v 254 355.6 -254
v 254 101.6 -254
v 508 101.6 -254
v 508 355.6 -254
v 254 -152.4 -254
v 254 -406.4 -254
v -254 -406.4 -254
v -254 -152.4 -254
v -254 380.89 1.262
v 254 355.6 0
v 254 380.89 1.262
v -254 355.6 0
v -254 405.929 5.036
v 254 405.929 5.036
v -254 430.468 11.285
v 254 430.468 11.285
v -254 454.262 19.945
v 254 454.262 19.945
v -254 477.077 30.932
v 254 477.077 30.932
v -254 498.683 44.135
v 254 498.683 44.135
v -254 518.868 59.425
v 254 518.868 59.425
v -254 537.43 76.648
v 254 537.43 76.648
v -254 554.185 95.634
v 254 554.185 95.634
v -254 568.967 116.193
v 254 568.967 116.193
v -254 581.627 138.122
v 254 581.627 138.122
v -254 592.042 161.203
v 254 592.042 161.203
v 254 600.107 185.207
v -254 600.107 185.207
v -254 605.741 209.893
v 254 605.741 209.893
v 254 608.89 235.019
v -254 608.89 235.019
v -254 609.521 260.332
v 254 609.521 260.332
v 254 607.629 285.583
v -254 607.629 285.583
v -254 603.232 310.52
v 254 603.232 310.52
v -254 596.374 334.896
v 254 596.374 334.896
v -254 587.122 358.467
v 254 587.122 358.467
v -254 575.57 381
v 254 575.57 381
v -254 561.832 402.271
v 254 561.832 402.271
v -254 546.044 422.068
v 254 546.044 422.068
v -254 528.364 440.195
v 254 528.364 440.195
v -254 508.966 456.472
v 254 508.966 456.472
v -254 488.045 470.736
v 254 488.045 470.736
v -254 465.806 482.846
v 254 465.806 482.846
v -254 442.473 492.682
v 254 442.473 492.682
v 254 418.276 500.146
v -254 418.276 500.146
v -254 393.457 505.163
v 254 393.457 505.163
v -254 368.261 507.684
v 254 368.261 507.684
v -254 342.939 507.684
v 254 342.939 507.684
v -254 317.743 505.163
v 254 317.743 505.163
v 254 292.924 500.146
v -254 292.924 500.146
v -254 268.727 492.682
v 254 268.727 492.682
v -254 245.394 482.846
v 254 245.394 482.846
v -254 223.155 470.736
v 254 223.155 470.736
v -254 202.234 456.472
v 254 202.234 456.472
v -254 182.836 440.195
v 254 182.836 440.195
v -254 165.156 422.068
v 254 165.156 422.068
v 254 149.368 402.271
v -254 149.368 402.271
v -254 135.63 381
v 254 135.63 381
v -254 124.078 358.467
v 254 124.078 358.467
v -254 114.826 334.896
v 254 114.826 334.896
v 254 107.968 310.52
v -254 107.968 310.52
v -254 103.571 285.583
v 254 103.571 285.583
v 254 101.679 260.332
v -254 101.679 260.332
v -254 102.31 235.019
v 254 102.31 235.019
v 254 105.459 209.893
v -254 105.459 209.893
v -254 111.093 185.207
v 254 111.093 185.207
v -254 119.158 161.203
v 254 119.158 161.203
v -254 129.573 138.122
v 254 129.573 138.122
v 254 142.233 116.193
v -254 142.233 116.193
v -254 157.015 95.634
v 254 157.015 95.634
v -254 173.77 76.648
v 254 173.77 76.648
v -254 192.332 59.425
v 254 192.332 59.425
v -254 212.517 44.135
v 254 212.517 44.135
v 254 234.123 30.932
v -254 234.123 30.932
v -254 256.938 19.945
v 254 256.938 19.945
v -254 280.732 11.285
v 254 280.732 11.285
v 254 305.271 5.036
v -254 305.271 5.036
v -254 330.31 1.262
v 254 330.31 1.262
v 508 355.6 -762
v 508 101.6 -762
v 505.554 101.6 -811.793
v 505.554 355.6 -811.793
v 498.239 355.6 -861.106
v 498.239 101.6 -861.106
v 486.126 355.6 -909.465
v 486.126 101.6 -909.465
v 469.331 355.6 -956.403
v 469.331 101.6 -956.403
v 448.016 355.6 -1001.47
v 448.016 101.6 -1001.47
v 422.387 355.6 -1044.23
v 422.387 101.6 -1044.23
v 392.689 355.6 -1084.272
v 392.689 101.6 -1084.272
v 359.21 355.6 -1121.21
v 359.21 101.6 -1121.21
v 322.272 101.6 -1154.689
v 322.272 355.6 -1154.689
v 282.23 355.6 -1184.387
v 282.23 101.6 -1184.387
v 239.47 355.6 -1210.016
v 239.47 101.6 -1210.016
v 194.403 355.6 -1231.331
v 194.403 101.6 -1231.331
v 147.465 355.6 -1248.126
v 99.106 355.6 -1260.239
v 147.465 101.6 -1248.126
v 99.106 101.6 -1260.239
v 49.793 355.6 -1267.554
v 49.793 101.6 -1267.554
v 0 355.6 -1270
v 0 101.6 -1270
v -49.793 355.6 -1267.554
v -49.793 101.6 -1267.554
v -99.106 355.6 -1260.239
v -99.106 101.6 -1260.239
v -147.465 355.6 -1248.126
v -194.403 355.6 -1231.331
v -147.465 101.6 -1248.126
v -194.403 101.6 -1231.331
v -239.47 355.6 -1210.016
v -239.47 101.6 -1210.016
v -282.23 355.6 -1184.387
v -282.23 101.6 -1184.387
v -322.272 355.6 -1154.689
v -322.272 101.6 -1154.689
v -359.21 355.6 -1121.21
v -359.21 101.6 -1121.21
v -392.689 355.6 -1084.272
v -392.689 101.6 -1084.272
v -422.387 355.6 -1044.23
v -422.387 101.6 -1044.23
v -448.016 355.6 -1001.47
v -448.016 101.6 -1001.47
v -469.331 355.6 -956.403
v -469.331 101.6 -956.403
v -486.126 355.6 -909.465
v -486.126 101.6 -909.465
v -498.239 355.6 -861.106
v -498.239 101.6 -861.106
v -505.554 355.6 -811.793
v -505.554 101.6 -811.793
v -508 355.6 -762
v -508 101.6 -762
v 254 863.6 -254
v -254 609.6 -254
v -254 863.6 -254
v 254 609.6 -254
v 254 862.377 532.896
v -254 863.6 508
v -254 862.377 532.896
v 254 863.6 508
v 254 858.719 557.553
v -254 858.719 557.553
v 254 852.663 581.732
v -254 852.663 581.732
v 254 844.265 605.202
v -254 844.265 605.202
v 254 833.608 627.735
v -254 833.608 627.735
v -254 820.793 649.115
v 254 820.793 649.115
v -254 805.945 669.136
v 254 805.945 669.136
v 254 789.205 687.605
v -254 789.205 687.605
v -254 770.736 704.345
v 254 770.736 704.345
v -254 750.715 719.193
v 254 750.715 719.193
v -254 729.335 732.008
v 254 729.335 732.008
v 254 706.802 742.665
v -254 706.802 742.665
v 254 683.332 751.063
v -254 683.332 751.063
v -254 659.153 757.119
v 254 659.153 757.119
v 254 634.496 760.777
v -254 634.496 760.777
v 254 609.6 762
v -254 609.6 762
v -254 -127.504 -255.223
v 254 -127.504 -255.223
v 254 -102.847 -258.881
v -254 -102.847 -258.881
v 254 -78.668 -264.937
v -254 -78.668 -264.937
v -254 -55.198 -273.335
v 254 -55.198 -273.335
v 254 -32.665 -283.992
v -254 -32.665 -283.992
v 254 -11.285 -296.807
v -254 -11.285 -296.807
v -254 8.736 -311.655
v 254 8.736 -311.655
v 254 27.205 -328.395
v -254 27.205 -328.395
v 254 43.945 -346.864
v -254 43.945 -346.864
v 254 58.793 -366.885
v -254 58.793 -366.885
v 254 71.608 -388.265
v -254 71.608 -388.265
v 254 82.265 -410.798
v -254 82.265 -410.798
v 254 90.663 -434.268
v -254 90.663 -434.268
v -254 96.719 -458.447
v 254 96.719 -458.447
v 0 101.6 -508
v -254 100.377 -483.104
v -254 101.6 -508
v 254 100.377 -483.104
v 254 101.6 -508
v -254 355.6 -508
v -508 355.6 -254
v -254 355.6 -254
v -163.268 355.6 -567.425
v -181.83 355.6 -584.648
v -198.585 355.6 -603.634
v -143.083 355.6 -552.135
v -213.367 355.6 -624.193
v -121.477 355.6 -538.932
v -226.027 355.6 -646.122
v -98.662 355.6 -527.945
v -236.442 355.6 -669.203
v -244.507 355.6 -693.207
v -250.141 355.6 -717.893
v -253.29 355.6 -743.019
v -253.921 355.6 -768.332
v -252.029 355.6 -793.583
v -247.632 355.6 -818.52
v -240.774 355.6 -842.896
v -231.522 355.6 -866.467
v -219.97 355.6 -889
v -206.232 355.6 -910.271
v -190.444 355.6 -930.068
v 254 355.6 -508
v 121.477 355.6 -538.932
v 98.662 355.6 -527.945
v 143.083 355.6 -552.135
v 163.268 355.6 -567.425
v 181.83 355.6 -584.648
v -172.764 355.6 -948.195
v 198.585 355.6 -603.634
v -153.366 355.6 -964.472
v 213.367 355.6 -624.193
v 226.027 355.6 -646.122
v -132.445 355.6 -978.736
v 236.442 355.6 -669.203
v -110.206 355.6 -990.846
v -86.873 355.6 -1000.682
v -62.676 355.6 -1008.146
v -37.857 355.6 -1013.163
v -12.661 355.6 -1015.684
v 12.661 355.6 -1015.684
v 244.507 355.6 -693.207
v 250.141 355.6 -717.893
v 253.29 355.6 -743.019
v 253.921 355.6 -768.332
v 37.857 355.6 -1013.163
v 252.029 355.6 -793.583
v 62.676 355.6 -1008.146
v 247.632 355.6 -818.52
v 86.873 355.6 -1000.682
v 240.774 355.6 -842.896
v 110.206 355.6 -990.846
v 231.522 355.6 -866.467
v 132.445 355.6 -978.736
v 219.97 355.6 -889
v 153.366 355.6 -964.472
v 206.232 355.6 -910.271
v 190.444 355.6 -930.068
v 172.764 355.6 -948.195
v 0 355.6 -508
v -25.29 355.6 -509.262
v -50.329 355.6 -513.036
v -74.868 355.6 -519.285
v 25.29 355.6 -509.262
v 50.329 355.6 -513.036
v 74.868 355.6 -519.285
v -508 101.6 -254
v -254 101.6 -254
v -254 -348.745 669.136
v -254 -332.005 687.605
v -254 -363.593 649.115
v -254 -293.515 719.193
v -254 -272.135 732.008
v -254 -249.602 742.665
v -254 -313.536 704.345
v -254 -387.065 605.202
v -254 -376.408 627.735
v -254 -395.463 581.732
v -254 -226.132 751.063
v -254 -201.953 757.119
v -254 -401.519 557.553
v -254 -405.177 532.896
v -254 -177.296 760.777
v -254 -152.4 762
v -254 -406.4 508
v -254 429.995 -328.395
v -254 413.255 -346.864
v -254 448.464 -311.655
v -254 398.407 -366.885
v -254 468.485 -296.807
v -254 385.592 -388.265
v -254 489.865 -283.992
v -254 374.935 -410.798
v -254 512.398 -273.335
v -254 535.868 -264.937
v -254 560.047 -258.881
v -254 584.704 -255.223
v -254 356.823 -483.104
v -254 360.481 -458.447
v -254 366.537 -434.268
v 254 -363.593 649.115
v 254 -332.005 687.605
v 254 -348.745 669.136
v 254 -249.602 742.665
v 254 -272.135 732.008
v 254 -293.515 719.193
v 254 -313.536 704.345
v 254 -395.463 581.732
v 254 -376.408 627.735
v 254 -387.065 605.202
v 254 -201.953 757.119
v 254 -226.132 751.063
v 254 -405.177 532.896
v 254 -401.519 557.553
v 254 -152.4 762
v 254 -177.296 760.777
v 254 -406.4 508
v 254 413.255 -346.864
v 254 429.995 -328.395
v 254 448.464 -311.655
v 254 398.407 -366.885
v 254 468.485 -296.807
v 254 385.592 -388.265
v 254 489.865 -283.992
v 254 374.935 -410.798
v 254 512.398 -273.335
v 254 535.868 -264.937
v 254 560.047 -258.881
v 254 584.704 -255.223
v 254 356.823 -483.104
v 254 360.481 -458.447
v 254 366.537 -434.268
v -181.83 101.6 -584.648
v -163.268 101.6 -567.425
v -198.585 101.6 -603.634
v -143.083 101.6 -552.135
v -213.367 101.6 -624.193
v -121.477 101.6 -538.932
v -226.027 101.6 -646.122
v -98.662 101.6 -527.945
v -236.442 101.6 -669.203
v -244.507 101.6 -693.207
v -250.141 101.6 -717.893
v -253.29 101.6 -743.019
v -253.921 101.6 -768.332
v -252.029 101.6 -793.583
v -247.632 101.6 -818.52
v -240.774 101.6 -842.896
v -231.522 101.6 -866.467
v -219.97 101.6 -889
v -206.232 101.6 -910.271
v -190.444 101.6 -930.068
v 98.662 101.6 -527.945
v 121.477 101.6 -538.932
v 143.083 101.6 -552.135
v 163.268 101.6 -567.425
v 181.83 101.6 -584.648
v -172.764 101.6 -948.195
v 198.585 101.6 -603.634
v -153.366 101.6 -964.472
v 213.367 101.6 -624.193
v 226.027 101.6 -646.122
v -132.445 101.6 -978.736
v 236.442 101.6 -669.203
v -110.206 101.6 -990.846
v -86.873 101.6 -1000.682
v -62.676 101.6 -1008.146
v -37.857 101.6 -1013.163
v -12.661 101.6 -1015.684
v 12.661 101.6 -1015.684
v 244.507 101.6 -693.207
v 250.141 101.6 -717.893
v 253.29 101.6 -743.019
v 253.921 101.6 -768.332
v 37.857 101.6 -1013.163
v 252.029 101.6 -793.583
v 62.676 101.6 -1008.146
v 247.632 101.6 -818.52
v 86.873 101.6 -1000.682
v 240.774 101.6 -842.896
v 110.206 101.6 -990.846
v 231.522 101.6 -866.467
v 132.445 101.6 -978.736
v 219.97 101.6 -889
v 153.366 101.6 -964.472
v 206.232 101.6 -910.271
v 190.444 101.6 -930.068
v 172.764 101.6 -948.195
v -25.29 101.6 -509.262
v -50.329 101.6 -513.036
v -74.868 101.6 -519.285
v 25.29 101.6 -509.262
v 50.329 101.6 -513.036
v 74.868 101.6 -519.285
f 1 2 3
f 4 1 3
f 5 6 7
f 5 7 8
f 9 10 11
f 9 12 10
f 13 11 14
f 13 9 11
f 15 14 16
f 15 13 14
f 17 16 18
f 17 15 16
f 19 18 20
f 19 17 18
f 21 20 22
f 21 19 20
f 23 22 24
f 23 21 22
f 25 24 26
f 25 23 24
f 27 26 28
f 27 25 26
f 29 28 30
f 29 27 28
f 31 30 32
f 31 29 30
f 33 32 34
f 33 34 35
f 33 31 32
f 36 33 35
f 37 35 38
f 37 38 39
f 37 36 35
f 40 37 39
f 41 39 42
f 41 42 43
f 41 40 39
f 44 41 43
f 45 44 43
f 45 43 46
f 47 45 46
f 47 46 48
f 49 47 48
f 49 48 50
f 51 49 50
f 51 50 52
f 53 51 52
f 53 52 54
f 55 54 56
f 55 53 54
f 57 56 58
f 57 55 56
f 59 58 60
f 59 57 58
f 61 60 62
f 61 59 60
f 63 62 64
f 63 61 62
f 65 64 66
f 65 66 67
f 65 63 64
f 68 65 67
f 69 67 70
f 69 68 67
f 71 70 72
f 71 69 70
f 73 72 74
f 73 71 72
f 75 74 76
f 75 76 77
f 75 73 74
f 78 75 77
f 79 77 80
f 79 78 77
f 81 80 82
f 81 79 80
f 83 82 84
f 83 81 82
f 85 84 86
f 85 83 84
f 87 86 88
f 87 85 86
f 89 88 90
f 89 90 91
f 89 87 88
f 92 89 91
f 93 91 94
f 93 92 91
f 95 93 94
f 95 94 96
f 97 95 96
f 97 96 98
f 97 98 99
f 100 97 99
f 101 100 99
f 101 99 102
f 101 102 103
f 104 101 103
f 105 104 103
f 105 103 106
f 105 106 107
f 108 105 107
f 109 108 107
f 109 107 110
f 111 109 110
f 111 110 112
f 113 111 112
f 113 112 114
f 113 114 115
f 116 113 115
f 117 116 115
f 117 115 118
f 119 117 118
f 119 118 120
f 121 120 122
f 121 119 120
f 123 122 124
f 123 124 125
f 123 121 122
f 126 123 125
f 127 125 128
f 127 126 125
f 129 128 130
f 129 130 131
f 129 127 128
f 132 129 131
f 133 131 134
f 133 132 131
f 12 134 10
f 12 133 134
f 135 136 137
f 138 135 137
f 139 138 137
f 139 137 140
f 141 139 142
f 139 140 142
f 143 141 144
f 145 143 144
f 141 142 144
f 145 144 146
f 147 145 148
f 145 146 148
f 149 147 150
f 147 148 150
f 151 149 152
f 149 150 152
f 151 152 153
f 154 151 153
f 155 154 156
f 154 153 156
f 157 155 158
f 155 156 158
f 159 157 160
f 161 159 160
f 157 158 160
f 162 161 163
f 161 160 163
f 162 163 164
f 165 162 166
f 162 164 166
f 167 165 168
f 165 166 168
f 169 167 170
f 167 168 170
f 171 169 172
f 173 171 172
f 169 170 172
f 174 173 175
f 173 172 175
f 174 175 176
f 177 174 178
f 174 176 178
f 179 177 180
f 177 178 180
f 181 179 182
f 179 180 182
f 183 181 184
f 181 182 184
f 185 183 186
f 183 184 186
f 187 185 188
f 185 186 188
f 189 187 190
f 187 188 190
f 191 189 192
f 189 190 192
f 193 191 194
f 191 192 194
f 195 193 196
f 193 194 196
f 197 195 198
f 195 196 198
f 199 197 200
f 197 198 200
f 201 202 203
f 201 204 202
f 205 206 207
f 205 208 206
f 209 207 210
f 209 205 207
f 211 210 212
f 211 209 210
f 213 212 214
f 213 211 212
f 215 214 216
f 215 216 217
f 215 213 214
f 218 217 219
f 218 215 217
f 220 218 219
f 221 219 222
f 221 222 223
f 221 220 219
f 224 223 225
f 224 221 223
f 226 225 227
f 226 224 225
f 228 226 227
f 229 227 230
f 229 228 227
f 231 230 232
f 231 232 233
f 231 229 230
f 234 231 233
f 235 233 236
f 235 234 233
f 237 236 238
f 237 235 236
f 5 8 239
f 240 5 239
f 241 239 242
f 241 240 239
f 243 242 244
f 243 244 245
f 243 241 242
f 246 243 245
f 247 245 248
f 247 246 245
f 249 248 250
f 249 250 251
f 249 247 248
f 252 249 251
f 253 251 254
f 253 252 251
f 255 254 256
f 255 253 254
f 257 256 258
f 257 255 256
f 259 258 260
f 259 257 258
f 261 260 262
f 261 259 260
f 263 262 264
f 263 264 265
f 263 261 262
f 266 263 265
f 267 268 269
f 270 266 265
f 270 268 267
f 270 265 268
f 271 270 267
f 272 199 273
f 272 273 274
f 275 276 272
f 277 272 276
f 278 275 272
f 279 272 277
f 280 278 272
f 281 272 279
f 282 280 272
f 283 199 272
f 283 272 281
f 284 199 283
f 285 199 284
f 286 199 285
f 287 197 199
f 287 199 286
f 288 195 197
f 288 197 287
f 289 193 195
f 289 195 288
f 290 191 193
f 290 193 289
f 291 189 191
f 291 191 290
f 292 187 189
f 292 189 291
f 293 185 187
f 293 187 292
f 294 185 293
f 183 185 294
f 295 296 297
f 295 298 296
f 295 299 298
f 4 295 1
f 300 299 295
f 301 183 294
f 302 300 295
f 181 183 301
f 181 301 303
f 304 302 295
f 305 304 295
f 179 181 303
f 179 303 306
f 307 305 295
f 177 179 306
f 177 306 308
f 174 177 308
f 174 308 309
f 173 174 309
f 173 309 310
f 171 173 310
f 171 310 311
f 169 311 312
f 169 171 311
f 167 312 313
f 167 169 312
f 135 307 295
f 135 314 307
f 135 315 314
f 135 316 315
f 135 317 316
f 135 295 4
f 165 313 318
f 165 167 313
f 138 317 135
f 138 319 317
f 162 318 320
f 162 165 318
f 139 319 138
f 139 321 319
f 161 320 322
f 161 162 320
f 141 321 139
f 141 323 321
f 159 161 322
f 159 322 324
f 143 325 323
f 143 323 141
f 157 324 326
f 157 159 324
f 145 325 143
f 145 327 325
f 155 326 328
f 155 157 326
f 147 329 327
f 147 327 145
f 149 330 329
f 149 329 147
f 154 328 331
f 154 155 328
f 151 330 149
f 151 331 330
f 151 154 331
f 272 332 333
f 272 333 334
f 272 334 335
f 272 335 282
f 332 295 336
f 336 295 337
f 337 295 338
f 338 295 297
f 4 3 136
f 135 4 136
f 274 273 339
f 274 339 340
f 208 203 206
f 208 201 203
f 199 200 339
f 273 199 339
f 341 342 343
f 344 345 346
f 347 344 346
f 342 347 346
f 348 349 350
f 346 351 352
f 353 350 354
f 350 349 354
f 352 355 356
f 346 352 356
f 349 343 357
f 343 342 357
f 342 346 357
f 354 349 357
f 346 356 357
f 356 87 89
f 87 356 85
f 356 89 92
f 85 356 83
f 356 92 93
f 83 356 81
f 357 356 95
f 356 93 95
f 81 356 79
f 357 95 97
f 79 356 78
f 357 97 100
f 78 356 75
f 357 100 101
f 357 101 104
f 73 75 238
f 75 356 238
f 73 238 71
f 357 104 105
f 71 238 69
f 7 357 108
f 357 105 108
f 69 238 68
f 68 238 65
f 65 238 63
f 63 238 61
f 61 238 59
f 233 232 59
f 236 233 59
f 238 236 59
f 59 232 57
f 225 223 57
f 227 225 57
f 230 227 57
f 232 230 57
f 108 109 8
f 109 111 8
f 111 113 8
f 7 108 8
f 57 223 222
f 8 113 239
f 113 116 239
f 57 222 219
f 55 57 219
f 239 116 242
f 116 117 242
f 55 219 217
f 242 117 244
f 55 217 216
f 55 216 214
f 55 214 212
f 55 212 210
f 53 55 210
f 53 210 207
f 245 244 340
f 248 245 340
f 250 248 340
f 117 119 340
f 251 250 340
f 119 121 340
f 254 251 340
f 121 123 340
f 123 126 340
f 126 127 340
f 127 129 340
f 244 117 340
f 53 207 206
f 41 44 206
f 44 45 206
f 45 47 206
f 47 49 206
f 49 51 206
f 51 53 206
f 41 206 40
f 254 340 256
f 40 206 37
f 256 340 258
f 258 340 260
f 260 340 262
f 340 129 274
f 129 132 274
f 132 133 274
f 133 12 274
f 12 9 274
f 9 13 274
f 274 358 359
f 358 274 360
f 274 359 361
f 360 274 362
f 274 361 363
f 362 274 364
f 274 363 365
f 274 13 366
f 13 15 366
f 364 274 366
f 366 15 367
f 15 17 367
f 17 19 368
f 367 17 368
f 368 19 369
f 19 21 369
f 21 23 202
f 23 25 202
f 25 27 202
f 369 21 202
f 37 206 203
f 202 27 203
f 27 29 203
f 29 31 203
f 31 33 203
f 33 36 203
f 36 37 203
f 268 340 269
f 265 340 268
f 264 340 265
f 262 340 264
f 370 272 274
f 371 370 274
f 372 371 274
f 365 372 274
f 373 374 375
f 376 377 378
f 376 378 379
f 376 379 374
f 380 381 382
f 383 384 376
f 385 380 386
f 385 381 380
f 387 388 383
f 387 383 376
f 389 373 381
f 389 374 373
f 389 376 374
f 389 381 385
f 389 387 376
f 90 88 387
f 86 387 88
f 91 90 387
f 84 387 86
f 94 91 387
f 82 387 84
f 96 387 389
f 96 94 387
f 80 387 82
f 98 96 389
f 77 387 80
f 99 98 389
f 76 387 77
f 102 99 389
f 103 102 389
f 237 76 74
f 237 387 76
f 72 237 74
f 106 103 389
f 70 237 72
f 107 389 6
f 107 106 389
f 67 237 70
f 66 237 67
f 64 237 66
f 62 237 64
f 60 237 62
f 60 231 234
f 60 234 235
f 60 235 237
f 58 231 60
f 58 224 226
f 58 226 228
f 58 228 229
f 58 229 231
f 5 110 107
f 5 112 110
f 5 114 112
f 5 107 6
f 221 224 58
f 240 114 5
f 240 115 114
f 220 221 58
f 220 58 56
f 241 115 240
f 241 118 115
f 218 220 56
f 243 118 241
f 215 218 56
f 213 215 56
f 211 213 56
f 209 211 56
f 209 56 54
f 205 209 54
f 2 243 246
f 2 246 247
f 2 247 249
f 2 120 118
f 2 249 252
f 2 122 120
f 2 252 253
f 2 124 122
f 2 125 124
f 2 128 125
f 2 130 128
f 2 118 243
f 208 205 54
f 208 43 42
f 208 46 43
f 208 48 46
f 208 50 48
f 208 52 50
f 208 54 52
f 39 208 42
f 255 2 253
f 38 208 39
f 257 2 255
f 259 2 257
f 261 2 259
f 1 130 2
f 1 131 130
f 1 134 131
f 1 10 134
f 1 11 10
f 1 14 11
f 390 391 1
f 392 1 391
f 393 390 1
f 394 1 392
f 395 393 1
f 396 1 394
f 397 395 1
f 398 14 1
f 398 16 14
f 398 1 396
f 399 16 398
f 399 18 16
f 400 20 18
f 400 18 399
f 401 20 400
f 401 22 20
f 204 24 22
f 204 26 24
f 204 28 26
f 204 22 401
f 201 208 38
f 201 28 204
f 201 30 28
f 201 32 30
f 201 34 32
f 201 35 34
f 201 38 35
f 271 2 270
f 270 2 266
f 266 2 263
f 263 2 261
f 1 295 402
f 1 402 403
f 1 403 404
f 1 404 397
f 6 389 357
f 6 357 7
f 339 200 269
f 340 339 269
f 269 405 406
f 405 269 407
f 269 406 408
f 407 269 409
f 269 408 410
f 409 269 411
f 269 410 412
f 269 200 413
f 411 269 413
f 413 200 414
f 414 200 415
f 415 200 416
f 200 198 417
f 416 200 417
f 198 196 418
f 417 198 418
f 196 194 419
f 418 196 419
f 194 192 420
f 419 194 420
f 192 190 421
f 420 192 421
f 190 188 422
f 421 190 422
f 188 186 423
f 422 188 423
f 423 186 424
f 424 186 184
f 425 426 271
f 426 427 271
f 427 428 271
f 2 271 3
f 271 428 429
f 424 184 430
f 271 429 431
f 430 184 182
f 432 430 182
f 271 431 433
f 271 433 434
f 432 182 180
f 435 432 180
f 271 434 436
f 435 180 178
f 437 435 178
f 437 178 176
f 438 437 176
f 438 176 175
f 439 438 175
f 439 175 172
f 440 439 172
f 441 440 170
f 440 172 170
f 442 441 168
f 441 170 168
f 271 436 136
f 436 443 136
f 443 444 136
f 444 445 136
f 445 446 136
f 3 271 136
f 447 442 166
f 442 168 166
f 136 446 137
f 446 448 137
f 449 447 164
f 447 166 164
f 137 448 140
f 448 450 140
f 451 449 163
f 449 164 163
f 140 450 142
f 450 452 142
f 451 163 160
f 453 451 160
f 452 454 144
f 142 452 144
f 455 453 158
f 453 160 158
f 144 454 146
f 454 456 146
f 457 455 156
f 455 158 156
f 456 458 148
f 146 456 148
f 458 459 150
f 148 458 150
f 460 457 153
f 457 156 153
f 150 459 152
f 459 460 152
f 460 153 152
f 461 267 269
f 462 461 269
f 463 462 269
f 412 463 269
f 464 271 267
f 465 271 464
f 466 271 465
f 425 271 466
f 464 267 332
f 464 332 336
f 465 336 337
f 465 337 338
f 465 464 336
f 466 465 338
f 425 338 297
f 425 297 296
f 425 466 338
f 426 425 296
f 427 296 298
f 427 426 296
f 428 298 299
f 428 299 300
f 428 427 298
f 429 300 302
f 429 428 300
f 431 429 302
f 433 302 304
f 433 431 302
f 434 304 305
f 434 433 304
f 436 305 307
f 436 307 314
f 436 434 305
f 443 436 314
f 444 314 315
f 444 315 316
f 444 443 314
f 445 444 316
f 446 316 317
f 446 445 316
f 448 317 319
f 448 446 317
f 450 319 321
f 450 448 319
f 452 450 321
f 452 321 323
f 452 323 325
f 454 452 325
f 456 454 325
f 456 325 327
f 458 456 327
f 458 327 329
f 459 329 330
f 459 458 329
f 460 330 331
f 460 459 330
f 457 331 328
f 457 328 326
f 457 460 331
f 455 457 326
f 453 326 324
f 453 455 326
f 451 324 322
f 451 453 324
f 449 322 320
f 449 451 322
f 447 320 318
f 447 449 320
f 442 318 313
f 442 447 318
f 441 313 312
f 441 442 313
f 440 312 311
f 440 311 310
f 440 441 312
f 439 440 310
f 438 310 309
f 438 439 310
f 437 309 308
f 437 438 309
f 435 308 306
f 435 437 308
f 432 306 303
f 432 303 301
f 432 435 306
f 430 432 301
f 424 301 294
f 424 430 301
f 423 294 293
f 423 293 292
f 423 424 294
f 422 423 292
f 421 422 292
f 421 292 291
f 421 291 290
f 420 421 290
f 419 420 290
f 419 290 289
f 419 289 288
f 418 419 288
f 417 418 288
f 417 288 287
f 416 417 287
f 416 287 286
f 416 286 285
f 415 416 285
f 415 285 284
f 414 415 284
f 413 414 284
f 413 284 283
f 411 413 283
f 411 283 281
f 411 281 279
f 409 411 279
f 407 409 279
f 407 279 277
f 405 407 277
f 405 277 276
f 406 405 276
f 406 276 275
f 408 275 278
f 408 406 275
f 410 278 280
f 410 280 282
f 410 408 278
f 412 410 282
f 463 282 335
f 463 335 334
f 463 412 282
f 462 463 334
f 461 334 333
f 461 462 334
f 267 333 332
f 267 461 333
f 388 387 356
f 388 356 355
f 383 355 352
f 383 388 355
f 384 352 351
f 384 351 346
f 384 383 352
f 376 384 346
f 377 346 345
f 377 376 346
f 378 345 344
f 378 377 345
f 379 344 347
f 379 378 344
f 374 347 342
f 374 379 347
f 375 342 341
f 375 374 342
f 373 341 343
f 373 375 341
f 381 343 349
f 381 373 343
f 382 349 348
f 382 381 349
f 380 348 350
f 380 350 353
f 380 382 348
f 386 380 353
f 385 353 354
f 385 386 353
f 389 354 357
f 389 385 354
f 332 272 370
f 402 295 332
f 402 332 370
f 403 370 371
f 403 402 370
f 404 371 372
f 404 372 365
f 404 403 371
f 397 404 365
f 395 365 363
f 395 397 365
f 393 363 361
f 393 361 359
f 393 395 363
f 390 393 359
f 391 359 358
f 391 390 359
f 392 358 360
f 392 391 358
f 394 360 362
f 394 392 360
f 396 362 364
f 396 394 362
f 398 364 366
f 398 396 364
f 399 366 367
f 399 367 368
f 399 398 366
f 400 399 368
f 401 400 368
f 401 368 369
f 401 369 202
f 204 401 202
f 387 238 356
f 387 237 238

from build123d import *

# Parameters (mm, degrees)
SKETCH1_R           = 254
BOSS_EXTRUDE2_DEPTH = 254
SKETCH3_R           = 254
BOSS_EXTRUDE3_DEPTH = 254


with BuildPart() as part:
    # Sketch1 → Boss-Extrude2 (new, symmetric)
    with BuildSketch(Plane(origin=(0, 0, 0), x_dir=(0, 0, -1), z_dir=(1, 0, 0))):
        with BuildLine():
            ThreePointArc((-508, 863.6), (-687.605122421, 789.205122421), (-762, 609.6))
            Line((-762, 609.6), (-762, -152.4))
            ThreePointArc((-762, -152.4), (-687.605122421, -332.005122421), (-508, -406.4))
            Line((-508, -406.4), (254, -406.4))
            Line((254, -406.4), (254, -152.4))
            ThreePointArc((254, -152.4), (328.394877579, 27.205122421), (508, 101.6))
            Line((508, 101.6), (254, 101.6))
            Line((254, 101.6), (254, 355.6))
            Line((254, 355.6), (508, 355.6))
            ThreePointArc((508, 355.6), (328.394877579, 429.994877579), (254, 609.6))
            Line((254, 609.6), (254, 863.6))
            Line((254, 863.6), (-508, 863.6))
        make_face()
        with Locations((-254, 355.6)):
            Circle(SKETCH1_R, mode=Mode.SUBTRACT)
    extrude(amount=BOSS_EXTRUDE2_DEPTH, both=True)

    # Sketch3 → Boss-Extrude3 (add)
    with BuildSketch(Plane(origin=(0, 101.6, 0), x_dir=(1, 0, 0), z_dir=(0, 1, 0))):
        with BuildLine():
            Line((-508, 254), (508, 254))
            Line((508, 254), (508, 762))
            ThreePointArc((508, 762), (0, 1270), (-508, 762))
            Line((-508, 762), (-508, 254))
        make_face()
        with Locations((0, 762)):
            Circle(SKETCH3_R, mode=Mode.SUBTRACT)
    extrude(amount=BOSS_EXTRUDE3_DEPTH)


solid = part.part
